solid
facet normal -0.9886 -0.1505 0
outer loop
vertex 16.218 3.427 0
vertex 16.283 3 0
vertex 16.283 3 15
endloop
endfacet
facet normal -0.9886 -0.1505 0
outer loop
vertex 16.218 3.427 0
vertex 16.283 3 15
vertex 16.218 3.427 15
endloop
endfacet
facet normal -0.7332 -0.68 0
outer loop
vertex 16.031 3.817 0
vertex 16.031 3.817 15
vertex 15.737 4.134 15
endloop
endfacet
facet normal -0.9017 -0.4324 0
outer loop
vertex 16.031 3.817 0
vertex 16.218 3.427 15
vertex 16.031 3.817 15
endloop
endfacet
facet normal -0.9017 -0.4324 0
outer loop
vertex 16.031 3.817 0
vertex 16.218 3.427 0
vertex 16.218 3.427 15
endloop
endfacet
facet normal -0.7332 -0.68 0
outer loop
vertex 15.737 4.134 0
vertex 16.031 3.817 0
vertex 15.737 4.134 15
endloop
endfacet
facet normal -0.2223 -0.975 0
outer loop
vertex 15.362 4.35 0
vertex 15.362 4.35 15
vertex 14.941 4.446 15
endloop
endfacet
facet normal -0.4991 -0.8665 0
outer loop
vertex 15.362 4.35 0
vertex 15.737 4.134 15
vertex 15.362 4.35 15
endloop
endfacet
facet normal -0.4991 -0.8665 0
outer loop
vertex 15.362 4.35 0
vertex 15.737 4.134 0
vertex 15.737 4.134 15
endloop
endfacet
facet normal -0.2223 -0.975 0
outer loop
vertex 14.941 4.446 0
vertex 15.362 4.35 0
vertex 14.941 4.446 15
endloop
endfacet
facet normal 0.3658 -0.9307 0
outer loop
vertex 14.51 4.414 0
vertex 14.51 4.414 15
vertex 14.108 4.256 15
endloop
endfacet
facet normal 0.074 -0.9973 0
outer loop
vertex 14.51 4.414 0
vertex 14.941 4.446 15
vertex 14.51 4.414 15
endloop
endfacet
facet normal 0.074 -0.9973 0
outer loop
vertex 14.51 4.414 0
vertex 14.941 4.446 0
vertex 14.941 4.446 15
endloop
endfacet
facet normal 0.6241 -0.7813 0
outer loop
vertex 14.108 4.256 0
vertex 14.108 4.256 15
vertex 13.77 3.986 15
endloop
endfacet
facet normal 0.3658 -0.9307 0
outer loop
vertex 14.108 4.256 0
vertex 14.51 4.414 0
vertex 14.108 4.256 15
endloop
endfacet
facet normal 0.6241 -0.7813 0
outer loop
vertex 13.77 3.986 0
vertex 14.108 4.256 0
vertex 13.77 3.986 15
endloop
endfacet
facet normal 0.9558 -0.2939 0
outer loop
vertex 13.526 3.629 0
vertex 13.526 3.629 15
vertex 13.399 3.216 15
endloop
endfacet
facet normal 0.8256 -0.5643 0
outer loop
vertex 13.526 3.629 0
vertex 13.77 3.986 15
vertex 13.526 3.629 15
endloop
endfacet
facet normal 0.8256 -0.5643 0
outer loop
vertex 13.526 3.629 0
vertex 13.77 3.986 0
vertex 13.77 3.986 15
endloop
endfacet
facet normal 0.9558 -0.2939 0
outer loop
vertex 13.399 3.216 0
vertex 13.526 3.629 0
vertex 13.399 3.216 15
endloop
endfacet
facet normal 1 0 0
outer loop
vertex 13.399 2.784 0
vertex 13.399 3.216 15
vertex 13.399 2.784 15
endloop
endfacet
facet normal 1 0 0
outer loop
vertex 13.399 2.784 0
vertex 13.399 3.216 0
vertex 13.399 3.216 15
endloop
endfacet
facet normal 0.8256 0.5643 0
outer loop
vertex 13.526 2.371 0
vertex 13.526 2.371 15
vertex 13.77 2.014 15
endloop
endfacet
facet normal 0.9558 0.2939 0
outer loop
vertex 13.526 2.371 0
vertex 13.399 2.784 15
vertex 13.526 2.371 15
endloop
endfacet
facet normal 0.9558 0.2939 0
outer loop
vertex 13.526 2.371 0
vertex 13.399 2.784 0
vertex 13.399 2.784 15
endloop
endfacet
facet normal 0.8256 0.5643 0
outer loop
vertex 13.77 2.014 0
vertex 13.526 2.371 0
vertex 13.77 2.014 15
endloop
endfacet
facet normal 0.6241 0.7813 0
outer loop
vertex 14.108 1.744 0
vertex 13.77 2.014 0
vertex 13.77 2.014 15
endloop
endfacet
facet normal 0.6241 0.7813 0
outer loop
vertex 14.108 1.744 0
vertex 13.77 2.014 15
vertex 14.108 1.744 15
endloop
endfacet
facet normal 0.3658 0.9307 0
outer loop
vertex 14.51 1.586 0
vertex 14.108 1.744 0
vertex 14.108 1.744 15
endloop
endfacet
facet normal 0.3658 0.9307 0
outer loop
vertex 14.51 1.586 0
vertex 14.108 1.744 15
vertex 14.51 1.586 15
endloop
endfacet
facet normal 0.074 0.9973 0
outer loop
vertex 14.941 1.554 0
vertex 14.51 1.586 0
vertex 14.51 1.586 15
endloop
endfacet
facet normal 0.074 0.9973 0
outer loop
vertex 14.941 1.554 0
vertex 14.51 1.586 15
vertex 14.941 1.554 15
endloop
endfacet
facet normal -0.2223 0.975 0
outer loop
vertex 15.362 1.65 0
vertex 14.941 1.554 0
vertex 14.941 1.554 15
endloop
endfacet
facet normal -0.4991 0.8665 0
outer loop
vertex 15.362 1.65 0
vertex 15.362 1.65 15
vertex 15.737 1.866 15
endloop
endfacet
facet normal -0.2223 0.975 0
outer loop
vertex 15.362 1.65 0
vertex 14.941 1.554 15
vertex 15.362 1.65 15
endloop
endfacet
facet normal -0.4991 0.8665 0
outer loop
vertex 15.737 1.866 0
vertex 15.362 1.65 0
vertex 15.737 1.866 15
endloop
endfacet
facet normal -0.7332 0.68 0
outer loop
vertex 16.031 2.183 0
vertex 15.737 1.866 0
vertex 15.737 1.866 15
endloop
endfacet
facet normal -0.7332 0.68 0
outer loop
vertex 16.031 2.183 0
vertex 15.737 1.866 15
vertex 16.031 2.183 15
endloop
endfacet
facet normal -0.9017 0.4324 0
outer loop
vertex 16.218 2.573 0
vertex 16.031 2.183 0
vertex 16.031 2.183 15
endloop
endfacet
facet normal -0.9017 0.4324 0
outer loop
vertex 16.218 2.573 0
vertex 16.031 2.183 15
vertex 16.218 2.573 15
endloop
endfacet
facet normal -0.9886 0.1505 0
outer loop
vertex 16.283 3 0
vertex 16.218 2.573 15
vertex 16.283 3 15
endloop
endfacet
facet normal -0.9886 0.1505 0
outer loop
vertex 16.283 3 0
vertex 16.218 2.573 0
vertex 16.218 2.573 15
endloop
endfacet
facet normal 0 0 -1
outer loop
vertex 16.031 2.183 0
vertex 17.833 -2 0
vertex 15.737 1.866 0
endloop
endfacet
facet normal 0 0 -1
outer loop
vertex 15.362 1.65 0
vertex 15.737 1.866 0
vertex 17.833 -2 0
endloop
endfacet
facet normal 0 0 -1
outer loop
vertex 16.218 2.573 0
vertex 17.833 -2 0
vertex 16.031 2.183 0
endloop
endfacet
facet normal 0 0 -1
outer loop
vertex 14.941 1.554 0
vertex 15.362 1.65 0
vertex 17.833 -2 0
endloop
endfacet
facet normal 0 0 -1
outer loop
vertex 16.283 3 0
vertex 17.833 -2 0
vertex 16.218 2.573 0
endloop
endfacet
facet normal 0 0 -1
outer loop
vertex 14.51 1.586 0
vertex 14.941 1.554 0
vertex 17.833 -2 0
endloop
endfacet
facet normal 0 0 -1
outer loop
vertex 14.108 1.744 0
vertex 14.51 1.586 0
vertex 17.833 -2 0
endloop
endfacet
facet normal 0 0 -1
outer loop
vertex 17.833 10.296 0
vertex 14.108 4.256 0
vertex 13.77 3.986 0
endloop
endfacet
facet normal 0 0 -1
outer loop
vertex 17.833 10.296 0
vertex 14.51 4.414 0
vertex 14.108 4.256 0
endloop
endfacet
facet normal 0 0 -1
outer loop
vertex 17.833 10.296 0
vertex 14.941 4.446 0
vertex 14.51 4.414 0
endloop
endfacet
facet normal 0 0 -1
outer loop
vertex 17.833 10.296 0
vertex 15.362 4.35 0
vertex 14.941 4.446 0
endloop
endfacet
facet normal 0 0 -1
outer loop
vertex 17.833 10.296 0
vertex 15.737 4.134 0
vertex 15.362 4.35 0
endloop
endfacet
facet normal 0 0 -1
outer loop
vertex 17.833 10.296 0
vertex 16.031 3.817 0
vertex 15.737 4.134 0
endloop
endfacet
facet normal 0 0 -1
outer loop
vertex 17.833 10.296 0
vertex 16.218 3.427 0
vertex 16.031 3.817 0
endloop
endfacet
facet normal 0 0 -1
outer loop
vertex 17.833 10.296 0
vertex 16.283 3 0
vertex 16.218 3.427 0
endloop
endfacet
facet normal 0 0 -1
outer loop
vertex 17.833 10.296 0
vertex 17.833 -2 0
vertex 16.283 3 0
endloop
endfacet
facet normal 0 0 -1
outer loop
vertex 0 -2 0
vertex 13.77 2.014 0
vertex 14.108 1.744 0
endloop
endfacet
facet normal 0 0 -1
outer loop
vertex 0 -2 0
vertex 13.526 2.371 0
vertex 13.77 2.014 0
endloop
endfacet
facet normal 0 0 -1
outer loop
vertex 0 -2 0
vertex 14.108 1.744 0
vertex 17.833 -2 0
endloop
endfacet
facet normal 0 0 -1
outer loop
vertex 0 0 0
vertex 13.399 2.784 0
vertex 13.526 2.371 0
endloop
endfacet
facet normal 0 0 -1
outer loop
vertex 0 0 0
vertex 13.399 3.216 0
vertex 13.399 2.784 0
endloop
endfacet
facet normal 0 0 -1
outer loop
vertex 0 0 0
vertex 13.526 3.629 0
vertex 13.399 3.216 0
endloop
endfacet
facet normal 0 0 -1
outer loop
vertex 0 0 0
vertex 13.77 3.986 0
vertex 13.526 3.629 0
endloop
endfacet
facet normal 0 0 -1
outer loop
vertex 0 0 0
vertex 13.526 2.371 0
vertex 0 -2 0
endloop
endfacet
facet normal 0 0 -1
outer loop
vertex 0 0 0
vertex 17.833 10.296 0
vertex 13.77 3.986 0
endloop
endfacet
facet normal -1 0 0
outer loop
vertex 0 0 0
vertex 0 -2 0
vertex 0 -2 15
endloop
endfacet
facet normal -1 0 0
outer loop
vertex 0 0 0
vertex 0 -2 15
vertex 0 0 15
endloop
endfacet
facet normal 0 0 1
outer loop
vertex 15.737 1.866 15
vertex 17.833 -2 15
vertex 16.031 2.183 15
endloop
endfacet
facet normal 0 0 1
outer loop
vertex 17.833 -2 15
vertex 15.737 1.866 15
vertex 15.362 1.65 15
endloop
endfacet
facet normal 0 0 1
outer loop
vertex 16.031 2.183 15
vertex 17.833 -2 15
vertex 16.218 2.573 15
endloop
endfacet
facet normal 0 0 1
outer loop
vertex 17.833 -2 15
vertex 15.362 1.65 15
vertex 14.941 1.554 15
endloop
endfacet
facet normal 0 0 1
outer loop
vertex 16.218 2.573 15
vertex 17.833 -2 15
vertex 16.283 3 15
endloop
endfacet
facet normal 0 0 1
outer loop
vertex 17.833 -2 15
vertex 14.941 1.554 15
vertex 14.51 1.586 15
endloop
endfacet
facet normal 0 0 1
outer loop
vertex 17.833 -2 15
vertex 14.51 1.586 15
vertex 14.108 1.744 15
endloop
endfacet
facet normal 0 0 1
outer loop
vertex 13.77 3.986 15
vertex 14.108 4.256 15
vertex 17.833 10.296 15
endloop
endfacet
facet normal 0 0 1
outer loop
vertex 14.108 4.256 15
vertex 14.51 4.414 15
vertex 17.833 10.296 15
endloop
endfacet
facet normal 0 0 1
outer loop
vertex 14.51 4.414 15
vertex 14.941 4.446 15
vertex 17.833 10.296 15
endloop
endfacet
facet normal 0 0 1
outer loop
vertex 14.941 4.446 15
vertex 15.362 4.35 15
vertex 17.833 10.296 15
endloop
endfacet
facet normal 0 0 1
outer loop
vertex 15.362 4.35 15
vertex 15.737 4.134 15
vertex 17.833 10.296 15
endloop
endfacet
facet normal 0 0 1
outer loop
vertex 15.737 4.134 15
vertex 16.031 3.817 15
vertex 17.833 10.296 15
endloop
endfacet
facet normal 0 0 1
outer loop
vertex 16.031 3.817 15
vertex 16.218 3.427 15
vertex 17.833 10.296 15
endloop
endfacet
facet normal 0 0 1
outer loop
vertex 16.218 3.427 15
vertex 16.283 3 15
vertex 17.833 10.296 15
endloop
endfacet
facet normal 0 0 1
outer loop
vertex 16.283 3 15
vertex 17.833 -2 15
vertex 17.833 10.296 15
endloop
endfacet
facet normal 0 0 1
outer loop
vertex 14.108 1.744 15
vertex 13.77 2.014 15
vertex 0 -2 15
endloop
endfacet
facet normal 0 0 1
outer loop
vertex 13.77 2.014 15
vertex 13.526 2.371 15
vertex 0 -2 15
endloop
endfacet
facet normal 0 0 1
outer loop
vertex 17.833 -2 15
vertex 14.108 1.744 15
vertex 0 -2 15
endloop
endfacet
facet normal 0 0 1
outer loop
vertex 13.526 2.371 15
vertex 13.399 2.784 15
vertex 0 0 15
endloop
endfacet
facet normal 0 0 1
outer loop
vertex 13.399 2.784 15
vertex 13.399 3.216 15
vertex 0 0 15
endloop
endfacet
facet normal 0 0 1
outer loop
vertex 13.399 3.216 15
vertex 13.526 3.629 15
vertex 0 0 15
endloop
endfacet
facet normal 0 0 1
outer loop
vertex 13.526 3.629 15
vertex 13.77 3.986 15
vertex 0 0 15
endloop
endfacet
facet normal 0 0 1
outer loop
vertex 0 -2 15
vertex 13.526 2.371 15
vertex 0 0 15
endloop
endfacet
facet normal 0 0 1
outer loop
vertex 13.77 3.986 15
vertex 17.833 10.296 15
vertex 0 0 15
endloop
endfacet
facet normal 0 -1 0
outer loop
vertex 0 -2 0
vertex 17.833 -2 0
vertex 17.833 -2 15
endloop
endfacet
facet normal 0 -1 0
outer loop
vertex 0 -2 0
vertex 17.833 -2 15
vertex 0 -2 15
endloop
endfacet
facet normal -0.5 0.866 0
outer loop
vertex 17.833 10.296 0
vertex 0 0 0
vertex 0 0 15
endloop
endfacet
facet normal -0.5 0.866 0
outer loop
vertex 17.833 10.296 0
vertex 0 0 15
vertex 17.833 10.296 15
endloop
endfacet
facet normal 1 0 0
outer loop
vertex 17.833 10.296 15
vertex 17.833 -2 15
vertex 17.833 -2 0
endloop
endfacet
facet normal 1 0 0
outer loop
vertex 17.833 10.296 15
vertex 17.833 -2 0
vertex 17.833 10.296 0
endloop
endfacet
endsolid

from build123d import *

# Parameters (mm, degrees)
RESSALTO_EXTRUS_O1_DEPTH   = 15
CORTE_EXTRUS_O1_DEPTH      = 26.475478406
CORTE_EXTRUS_O1_DEPTH_BACK = 26.475478406
ESBO_O2_R                  = 1.45


with BuildPart() as part:
    # Esboço1 → Ressalto-extrusão1 (new body)
    with BuildSketch(Plane.XY):
        Polygon((0, 0), (17.8325545, 10.295630141), (17.8325545, 0.295630141), (17.8325545, -2), (0, -2), align=None)
    extrude(amount=RESSALTO_EXTRUS_O1_DEPTH)

    # Esboço2 → Corte-extrusão1 (cut, two sides: drawn at the far end of the back side and taken through both)
    with BuildSketch(Plane.XY.offset(15).offset(-CORTE_EXTRUS_O1_DEPTH_BACK)):
        with Locations((14.8325545, 3)):
            Circle(ESBO_O2_R)
    extrude(amount=CORTE_EXTRUS_O1_DEPTH + CORTE_EXTRUS_O1_DEPTH_BACK, mode=Mode.SUBTRACT)


solid = part.part
